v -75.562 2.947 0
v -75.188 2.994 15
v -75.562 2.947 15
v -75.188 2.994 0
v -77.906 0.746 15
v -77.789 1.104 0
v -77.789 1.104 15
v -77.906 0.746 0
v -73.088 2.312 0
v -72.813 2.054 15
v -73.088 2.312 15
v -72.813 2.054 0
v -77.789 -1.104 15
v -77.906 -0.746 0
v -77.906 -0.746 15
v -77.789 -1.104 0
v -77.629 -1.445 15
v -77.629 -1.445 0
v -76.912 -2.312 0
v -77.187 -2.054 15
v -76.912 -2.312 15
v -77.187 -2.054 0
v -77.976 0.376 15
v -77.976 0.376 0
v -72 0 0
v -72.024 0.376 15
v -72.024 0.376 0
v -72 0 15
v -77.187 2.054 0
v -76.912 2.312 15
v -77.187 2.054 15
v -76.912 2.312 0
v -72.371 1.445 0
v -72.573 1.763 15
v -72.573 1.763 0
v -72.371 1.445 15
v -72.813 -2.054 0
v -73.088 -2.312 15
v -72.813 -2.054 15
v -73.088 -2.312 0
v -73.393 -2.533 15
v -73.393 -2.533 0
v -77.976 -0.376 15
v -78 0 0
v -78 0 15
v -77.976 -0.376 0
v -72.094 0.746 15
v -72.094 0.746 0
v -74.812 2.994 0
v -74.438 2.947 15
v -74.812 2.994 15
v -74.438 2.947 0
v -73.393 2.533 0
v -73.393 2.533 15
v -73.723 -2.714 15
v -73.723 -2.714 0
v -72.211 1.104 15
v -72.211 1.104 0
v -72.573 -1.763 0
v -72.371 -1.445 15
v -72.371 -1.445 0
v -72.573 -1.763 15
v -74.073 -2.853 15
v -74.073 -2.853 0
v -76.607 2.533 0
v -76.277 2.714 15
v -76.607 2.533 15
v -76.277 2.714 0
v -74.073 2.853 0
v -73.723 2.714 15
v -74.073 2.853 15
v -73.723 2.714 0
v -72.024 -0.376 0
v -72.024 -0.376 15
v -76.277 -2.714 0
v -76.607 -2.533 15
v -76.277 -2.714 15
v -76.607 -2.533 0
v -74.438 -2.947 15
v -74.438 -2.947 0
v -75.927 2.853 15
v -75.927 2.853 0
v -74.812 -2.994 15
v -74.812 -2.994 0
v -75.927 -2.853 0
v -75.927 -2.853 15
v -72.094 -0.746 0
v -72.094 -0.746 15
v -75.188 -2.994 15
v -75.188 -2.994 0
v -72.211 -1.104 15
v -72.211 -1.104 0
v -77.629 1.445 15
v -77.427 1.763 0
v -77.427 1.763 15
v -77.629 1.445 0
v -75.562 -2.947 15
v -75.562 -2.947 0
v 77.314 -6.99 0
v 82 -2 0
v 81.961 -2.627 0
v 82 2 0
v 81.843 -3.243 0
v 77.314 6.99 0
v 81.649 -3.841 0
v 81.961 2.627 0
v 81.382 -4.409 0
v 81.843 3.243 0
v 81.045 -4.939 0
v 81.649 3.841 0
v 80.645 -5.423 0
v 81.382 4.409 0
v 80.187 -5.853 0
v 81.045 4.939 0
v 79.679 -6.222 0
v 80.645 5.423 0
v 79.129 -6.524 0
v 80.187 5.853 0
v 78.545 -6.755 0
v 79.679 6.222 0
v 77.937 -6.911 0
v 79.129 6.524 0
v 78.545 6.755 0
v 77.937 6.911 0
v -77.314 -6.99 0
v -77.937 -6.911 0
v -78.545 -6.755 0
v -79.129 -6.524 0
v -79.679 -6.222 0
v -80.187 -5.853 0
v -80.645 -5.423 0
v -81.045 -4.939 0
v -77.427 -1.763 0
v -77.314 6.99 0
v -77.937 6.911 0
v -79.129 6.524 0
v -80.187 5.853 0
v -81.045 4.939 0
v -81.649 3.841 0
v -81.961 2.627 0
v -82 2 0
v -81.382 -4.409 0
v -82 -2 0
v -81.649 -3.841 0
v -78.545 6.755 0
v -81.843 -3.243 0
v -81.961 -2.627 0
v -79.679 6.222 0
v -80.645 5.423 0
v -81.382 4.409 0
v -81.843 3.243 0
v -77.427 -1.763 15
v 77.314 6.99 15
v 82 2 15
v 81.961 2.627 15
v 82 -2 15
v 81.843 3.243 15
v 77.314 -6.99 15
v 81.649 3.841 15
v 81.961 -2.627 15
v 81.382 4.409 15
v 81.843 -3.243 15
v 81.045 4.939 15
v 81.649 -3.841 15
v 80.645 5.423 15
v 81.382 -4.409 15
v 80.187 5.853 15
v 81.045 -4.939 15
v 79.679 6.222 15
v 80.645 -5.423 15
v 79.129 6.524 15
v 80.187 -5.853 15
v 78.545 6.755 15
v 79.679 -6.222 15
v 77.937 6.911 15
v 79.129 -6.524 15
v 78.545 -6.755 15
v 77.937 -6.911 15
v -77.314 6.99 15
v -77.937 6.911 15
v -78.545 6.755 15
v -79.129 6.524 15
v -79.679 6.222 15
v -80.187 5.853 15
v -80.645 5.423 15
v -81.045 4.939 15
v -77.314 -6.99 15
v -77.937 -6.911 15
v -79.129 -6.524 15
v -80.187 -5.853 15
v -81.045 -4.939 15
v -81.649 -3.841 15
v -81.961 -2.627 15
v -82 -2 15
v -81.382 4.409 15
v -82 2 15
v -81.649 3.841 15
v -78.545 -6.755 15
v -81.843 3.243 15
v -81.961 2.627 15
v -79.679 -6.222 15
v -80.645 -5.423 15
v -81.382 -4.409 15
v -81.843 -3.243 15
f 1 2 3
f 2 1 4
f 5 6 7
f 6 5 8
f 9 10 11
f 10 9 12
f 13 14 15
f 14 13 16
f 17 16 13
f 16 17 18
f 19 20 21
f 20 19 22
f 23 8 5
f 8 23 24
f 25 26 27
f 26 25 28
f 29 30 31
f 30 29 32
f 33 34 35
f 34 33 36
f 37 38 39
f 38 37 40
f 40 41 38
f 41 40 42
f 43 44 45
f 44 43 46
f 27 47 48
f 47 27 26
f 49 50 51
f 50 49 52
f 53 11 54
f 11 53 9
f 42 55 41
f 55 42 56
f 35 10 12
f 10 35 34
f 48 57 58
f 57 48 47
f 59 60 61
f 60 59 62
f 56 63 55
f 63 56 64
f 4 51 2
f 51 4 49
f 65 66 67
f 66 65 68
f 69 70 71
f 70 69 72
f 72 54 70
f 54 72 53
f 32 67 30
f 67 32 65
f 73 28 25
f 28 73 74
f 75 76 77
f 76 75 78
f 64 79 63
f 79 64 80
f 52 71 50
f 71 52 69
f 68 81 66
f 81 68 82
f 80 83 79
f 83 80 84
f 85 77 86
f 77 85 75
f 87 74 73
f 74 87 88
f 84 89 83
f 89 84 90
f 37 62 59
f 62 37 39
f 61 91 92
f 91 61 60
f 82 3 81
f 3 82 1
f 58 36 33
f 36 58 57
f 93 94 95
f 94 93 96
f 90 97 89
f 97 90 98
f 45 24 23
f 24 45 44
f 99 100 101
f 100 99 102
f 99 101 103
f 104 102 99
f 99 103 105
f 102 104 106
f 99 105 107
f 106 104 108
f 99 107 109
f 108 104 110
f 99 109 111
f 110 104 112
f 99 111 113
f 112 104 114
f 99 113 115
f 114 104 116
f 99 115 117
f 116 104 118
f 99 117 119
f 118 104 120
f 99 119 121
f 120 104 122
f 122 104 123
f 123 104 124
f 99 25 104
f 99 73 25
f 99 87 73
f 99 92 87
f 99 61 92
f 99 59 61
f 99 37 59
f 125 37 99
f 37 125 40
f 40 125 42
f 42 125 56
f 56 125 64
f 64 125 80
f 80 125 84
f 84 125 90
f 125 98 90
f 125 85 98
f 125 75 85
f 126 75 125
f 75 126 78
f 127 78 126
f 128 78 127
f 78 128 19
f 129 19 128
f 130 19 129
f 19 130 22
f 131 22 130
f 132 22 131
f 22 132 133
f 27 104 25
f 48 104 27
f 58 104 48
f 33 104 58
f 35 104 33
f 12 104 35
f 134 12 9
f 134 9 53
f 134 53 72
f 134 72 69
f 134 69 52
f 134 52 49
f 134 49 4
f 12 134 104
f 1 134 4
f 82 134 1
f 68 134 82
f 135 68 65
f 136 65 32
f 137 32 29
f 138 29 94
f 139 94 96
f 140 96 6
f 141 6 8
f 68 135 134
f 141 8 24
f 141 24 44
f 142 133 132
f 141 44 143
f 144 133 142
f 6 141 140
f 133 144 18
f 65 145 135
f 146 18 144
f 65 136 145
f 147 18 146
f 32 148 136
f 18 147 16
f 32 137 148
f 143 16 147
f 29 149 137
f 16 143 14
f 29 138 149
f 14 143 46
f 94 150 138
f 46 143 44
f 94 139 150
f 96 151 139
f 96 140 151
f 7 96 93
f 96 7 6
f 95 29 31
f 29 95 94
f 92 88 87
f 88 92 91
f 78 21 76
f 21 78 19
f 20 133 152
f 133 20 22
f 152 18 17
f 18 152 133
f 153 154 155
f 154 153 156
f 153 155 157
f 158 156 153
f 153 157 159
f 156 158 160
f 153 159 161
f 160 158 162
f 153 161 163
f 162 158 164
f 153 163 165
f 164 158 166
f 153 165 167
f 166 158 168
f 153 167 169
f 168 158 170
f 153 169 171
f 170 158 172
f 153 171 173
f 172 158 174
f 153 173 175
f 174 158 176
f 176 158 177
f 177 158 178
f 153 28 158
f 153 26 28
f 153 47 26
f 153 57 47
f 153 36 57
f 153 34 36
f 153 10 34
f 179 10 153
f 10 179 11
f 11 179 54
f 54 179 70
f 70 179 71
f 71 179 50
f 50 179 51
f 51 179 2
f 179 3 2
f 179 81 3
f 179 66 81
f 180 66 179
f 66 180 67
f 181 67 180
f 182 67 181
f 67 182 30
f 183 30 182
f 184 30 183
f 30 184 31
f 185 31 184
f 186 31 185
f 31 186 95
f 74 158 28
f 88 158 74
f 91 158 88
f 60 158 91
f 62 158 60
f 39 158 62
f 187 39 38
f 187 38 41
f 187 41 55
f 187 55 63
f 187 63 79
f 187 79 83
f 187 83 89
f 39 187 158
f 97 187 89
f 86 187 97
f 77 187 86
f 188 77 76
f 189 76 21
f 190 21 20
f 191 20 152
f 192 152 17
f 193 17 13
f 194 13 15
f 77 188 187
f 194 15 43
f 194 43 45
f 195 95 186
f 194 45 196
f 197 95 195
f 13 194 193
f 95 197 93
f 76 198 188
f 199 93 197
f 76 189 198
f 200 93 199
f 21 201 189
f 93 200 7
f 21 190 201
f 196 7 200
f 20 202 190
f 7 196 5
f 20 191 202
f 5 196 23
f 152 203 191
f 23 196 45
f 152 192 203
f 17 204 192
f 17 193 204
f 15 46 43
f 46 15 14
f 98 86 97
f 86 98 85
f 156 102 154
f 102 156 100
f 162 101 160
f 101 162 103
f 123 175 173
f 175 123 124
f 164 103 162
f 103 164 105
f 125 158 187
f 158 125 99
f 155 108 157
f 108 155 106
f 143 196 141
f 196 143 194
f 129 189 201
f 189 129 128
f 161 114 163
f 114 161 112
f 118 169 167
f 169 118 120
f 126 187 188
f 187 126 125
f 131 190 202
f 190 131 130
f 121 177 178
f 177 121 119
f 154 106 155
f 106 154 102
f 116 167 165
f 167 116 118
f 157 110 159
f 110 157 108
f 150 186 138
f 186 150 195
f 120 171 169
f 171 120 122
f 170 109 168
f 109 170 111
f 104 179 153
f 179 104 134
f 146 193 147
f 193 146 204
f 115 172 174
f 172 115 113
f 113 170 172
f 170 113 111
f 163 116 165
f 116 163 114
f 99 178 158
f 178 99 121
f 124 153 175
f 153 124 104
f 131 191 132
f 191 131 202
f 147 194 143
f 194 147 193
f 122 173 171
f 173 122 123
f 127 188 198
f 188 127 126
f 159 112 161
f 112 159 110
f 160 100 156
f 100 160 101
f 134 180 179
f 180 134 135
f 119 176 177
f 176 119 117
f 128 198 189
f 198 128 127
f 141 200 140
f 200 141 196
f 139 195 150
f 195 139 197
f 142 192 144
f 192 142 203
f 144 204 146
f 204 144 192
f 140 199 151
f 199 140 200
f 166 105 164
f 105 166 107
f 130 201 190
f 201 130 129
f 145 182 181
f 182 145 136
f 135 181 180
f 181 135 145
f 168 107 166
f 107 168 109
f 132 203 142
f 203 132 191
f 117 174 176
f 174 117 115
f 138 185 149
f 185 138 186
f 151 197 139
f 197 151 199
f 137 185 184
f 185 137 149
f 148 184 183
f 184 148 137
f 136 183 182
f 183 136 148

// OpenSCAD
$fn = 50;


difference() {
	union() {
		hull() {
			translate(v = [-77.0000000000, 2.0000000000, 0]) {
				cylinder(h = 15, r = 5);
			}
			translate(v = [77.0000000000, 2.0000000000, 0]) {
				cylinder(h = 15, r = 5);
			}
			translate(v = [-77.0000000000, -2.0000000000, 0]) {
				cylinder(h = 15, r = 5);
			}
			translate(v = [77.0000000000, -2.0000000000, 0]) {
				cylinder(h = 15, r = 5);
			}
		}
	}
	union() {
		translate(v = [-75.0000000000, 0.0000000000, 0]) {
			cylinder(h = 15, r = 3.0000000000);
		}
		translate(v = [-75.0000000000, 0.0000000000, 0]) {
			cylinder(h = 15, r = 1.5000000000);
		}
		translate(v = [-75.0000000000, 0.0000000000, 0]) {
			cylinder(h = 15, r = 1.5000000000);
		}
		translate(v = [-75.0000000000, 0.0000000000, 0]) {
			cylinder(h = 15, r = 1.5000000000);
		}
	}
}
